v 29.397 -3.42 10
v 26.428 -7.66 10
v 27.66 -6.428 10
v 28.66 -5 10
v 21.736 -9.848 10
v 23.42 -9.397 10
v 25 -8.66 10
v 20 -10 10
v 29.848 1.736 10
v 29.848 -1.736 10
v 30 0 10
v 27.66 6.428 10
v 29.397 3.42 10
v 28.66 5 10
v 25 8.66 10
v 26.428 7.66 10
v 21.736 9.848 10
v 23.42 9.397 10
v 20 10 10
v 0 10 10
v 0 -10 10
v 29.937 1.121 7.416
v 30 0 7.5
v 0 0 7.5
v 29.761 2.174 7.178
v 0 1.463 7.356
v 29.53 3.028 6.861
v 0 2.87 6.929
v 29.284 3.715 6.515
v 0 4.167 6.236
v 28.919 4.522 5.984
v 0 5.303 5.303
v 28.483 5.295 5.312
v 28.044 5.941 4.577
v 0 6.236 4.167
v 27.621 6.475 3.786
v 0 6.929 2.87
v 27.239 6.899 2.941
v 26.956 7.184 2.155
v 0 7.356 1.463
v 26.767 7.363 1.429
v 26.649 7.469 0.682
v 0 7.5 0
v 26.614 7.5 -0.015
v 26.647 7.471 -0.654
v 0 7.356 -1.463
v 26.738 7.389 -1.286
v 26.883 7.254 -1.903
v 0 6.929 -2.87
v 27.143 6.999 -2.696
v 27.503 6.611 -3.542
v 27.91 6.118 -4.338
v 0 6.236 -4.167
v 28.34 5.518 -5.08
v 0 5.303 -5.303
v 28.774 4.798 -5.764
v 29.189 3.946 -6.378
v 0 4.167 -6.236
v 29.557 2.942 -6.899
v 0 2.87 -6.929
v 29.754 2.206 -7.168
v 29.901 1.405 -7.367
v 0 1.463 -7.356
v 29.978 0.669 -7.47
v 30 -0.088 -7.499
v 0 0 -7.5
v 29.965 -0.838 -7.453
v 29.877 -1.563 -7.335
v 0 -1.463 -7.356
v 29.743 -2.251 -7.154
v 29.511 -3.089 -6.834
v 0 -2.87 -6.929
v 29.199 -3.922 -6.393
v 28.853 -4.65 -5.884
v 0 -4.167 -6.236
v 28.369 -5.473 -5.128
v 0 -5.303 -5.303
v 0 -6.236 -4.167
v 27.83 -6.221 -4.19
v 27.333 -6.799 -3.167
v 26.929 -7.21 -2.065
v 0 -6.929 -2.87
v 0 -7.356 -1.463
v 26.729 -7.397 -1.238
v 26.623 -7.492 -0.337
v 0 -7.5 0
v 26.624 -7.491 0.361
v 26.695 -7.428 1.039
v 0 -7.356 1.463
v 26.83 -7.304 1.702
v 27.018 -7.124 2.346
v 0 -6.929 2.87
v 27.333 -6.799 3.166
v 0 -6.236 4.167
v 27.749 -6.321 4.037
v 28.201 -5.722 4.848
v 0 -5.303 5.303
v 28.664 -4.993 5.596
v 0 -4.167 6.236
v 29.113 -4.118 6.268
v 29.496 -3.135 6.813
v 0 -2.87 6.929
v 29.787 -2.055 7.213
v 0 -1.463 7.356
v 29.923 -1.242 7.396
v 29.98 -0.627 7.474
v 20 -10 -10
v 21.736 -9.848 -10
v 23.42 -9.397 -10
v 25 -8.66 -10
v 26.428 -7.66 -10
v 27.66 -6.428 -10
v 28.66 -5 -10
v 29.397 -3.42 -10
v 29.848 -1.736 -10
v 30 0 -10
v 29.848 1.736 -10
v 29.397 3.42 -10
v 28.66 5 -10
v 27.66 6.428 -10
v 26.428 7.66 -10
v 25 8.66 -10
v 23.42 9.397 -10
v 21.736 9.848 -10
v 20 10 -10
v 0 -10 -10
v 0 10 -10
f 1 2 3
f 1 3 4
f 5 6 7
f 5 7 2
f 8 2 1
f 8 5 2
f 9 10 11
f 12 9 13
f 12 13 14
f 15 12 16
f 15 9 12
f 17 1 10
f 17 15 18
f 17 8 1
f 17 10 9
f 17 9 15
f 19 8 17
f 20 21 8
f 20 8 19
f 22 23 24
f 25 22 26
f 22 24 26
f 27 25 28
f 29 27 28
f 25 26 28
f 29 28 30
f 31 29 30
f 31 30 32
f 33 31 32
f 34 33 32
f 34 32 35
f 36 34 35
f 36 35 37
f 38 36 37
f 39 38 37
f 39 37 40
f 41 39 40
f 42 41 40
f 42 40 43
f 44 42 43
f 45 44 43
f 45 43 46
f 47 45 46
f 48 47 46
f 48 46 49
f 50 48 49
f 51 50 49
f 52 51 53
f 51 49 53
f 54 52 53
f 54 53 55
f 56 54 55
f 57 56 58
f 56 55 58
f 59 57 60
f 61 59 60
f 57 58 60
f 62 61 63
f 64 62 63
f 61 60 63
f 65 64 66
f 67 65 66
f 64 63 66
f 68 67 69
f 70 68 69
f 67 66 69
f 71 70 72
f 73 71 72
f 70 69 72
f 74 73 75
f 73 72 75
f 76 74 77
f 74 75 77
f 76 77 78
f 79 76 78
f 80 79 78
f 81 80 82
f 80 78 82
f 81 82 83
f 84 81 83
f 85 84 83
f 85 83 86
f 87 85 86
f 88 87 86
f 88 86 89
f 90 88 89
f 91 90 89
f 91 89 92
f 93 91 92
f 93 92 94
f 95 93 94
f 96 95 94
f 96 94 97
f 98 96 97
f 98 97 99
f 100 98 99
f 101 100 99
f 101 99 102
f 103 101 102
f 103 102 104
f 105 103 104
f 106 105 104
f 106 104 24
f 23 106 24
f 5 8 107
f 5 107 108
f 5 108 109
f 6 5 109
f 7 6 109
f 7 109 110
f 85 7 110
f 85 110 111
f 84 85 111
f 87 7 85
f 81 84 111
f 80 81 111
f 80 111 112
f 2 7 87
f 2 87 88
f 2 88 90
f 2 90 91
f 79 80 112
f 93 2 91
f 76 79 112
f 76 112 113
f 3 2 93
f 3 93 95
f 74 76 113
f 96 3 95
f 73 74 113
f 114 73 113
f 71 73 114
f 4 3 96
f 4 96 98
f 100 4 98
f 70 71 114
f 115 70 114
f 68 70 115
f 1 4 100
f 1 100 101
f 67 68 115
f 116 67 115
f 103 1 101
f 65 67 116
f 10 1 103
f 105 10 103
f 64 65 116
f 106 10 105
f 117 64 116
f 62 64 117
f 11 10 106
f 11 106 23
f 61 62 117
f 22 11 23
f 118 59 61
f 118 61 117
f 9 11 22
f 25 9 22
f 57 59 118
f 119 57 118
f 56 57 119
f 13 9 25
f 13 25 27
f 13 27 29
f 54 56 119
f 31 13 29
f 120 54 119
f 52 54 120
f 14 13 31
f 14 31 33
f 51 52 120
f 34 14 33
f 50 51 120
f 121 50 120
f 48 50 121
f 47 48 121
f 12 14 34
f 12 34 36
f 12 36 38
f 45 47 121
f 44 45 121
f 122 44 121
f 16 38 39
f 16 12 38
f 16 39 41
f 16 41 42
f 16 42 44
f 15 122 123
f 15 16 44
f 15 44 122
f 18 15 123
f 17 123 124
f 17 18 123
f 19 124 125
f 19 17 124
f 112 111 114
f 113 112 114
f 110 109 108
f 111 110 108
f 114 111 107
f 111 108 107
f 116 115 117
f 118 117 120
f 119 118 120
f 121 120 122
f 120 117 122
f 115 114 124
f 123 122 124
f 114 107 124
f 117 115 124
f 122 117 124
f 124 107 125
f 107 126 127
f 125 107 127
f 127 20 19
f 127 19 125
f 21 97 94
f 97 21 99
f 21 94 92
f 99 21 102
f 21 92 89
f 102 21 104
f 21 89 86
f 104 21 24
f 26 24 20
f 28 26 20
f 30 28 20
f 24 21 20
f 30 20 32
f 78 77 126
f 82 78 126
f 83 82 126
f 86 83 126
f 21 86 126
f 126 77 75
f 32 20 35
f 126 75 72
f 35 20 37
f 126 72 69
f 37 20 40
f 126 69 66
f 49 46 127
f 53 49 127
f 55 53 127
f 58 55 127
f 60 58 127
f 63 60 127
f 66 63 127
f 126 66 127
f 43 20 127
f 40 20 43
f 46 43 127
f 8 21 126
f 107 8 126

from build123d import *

# Parameters (mm, degrees)
SKETCH1_W           = 20
SKETCH1_H           = 20
BOSS_EXTRUDE1_DEPTH = 30
FILLET3_RADIUS      = 10
FILLET3_LENGTH      = 20
SKETCH2_R           = 7.5
CUT_EXTRUDE1_DEPTH  = 30


with BuildPart() as part:
    # Sketch1 → Boss-Extrude1 (new body)
    with BuildSketch(Plane(origin=(0, 0, 0), x_dir=(0, 0, -1), z_dir=(1, 0, 0))):
        Rectangle(SKETCH1_W, SKETCH1_H)
    extrude(amount=BOSS_EXTRUDE1_DEPTH)

    # Fillet3: full round fillet: the end face becomes a half cylinder, R = half its width
    fillet3_face = Plane((30, 0, 0), x_dir=(0, 0, 1), z_dir=(1, 0, 0))  # on the end face: x along it, z out of the body
    fillet3_slab = fillet3_face.offset(-FILLET3_RADIUS / 2) * Box(FILLET3_LENGTH, 2 * FILLET3_RADIUS, FILLET3_RADIUS, mode=Mode.PRIVATE)  # the body's end, R deep
    fillet3_round = Plane((20, 0, 0), x_dir=(1, 0, 0), z_dir=(0, 0, 1)) * Cylinder(FILLET3_RADIUS, FILLET3_LENGTH, mode=Mode.PRIVATE)  # its axis R under the face
    add(fillet3_slab - fillet3_round, mode=Mode.SUBTRACT)

    # Sketch2 → Cut-Extrude1 (cut)
    with BuildSketch(Plane.ZY):
        Circle(SKETCH2_R)
    extrude(amount=-CUT_EXTRUDE1_DEPTH, mode=Mode.SUBTRACT)


solid = part.part
